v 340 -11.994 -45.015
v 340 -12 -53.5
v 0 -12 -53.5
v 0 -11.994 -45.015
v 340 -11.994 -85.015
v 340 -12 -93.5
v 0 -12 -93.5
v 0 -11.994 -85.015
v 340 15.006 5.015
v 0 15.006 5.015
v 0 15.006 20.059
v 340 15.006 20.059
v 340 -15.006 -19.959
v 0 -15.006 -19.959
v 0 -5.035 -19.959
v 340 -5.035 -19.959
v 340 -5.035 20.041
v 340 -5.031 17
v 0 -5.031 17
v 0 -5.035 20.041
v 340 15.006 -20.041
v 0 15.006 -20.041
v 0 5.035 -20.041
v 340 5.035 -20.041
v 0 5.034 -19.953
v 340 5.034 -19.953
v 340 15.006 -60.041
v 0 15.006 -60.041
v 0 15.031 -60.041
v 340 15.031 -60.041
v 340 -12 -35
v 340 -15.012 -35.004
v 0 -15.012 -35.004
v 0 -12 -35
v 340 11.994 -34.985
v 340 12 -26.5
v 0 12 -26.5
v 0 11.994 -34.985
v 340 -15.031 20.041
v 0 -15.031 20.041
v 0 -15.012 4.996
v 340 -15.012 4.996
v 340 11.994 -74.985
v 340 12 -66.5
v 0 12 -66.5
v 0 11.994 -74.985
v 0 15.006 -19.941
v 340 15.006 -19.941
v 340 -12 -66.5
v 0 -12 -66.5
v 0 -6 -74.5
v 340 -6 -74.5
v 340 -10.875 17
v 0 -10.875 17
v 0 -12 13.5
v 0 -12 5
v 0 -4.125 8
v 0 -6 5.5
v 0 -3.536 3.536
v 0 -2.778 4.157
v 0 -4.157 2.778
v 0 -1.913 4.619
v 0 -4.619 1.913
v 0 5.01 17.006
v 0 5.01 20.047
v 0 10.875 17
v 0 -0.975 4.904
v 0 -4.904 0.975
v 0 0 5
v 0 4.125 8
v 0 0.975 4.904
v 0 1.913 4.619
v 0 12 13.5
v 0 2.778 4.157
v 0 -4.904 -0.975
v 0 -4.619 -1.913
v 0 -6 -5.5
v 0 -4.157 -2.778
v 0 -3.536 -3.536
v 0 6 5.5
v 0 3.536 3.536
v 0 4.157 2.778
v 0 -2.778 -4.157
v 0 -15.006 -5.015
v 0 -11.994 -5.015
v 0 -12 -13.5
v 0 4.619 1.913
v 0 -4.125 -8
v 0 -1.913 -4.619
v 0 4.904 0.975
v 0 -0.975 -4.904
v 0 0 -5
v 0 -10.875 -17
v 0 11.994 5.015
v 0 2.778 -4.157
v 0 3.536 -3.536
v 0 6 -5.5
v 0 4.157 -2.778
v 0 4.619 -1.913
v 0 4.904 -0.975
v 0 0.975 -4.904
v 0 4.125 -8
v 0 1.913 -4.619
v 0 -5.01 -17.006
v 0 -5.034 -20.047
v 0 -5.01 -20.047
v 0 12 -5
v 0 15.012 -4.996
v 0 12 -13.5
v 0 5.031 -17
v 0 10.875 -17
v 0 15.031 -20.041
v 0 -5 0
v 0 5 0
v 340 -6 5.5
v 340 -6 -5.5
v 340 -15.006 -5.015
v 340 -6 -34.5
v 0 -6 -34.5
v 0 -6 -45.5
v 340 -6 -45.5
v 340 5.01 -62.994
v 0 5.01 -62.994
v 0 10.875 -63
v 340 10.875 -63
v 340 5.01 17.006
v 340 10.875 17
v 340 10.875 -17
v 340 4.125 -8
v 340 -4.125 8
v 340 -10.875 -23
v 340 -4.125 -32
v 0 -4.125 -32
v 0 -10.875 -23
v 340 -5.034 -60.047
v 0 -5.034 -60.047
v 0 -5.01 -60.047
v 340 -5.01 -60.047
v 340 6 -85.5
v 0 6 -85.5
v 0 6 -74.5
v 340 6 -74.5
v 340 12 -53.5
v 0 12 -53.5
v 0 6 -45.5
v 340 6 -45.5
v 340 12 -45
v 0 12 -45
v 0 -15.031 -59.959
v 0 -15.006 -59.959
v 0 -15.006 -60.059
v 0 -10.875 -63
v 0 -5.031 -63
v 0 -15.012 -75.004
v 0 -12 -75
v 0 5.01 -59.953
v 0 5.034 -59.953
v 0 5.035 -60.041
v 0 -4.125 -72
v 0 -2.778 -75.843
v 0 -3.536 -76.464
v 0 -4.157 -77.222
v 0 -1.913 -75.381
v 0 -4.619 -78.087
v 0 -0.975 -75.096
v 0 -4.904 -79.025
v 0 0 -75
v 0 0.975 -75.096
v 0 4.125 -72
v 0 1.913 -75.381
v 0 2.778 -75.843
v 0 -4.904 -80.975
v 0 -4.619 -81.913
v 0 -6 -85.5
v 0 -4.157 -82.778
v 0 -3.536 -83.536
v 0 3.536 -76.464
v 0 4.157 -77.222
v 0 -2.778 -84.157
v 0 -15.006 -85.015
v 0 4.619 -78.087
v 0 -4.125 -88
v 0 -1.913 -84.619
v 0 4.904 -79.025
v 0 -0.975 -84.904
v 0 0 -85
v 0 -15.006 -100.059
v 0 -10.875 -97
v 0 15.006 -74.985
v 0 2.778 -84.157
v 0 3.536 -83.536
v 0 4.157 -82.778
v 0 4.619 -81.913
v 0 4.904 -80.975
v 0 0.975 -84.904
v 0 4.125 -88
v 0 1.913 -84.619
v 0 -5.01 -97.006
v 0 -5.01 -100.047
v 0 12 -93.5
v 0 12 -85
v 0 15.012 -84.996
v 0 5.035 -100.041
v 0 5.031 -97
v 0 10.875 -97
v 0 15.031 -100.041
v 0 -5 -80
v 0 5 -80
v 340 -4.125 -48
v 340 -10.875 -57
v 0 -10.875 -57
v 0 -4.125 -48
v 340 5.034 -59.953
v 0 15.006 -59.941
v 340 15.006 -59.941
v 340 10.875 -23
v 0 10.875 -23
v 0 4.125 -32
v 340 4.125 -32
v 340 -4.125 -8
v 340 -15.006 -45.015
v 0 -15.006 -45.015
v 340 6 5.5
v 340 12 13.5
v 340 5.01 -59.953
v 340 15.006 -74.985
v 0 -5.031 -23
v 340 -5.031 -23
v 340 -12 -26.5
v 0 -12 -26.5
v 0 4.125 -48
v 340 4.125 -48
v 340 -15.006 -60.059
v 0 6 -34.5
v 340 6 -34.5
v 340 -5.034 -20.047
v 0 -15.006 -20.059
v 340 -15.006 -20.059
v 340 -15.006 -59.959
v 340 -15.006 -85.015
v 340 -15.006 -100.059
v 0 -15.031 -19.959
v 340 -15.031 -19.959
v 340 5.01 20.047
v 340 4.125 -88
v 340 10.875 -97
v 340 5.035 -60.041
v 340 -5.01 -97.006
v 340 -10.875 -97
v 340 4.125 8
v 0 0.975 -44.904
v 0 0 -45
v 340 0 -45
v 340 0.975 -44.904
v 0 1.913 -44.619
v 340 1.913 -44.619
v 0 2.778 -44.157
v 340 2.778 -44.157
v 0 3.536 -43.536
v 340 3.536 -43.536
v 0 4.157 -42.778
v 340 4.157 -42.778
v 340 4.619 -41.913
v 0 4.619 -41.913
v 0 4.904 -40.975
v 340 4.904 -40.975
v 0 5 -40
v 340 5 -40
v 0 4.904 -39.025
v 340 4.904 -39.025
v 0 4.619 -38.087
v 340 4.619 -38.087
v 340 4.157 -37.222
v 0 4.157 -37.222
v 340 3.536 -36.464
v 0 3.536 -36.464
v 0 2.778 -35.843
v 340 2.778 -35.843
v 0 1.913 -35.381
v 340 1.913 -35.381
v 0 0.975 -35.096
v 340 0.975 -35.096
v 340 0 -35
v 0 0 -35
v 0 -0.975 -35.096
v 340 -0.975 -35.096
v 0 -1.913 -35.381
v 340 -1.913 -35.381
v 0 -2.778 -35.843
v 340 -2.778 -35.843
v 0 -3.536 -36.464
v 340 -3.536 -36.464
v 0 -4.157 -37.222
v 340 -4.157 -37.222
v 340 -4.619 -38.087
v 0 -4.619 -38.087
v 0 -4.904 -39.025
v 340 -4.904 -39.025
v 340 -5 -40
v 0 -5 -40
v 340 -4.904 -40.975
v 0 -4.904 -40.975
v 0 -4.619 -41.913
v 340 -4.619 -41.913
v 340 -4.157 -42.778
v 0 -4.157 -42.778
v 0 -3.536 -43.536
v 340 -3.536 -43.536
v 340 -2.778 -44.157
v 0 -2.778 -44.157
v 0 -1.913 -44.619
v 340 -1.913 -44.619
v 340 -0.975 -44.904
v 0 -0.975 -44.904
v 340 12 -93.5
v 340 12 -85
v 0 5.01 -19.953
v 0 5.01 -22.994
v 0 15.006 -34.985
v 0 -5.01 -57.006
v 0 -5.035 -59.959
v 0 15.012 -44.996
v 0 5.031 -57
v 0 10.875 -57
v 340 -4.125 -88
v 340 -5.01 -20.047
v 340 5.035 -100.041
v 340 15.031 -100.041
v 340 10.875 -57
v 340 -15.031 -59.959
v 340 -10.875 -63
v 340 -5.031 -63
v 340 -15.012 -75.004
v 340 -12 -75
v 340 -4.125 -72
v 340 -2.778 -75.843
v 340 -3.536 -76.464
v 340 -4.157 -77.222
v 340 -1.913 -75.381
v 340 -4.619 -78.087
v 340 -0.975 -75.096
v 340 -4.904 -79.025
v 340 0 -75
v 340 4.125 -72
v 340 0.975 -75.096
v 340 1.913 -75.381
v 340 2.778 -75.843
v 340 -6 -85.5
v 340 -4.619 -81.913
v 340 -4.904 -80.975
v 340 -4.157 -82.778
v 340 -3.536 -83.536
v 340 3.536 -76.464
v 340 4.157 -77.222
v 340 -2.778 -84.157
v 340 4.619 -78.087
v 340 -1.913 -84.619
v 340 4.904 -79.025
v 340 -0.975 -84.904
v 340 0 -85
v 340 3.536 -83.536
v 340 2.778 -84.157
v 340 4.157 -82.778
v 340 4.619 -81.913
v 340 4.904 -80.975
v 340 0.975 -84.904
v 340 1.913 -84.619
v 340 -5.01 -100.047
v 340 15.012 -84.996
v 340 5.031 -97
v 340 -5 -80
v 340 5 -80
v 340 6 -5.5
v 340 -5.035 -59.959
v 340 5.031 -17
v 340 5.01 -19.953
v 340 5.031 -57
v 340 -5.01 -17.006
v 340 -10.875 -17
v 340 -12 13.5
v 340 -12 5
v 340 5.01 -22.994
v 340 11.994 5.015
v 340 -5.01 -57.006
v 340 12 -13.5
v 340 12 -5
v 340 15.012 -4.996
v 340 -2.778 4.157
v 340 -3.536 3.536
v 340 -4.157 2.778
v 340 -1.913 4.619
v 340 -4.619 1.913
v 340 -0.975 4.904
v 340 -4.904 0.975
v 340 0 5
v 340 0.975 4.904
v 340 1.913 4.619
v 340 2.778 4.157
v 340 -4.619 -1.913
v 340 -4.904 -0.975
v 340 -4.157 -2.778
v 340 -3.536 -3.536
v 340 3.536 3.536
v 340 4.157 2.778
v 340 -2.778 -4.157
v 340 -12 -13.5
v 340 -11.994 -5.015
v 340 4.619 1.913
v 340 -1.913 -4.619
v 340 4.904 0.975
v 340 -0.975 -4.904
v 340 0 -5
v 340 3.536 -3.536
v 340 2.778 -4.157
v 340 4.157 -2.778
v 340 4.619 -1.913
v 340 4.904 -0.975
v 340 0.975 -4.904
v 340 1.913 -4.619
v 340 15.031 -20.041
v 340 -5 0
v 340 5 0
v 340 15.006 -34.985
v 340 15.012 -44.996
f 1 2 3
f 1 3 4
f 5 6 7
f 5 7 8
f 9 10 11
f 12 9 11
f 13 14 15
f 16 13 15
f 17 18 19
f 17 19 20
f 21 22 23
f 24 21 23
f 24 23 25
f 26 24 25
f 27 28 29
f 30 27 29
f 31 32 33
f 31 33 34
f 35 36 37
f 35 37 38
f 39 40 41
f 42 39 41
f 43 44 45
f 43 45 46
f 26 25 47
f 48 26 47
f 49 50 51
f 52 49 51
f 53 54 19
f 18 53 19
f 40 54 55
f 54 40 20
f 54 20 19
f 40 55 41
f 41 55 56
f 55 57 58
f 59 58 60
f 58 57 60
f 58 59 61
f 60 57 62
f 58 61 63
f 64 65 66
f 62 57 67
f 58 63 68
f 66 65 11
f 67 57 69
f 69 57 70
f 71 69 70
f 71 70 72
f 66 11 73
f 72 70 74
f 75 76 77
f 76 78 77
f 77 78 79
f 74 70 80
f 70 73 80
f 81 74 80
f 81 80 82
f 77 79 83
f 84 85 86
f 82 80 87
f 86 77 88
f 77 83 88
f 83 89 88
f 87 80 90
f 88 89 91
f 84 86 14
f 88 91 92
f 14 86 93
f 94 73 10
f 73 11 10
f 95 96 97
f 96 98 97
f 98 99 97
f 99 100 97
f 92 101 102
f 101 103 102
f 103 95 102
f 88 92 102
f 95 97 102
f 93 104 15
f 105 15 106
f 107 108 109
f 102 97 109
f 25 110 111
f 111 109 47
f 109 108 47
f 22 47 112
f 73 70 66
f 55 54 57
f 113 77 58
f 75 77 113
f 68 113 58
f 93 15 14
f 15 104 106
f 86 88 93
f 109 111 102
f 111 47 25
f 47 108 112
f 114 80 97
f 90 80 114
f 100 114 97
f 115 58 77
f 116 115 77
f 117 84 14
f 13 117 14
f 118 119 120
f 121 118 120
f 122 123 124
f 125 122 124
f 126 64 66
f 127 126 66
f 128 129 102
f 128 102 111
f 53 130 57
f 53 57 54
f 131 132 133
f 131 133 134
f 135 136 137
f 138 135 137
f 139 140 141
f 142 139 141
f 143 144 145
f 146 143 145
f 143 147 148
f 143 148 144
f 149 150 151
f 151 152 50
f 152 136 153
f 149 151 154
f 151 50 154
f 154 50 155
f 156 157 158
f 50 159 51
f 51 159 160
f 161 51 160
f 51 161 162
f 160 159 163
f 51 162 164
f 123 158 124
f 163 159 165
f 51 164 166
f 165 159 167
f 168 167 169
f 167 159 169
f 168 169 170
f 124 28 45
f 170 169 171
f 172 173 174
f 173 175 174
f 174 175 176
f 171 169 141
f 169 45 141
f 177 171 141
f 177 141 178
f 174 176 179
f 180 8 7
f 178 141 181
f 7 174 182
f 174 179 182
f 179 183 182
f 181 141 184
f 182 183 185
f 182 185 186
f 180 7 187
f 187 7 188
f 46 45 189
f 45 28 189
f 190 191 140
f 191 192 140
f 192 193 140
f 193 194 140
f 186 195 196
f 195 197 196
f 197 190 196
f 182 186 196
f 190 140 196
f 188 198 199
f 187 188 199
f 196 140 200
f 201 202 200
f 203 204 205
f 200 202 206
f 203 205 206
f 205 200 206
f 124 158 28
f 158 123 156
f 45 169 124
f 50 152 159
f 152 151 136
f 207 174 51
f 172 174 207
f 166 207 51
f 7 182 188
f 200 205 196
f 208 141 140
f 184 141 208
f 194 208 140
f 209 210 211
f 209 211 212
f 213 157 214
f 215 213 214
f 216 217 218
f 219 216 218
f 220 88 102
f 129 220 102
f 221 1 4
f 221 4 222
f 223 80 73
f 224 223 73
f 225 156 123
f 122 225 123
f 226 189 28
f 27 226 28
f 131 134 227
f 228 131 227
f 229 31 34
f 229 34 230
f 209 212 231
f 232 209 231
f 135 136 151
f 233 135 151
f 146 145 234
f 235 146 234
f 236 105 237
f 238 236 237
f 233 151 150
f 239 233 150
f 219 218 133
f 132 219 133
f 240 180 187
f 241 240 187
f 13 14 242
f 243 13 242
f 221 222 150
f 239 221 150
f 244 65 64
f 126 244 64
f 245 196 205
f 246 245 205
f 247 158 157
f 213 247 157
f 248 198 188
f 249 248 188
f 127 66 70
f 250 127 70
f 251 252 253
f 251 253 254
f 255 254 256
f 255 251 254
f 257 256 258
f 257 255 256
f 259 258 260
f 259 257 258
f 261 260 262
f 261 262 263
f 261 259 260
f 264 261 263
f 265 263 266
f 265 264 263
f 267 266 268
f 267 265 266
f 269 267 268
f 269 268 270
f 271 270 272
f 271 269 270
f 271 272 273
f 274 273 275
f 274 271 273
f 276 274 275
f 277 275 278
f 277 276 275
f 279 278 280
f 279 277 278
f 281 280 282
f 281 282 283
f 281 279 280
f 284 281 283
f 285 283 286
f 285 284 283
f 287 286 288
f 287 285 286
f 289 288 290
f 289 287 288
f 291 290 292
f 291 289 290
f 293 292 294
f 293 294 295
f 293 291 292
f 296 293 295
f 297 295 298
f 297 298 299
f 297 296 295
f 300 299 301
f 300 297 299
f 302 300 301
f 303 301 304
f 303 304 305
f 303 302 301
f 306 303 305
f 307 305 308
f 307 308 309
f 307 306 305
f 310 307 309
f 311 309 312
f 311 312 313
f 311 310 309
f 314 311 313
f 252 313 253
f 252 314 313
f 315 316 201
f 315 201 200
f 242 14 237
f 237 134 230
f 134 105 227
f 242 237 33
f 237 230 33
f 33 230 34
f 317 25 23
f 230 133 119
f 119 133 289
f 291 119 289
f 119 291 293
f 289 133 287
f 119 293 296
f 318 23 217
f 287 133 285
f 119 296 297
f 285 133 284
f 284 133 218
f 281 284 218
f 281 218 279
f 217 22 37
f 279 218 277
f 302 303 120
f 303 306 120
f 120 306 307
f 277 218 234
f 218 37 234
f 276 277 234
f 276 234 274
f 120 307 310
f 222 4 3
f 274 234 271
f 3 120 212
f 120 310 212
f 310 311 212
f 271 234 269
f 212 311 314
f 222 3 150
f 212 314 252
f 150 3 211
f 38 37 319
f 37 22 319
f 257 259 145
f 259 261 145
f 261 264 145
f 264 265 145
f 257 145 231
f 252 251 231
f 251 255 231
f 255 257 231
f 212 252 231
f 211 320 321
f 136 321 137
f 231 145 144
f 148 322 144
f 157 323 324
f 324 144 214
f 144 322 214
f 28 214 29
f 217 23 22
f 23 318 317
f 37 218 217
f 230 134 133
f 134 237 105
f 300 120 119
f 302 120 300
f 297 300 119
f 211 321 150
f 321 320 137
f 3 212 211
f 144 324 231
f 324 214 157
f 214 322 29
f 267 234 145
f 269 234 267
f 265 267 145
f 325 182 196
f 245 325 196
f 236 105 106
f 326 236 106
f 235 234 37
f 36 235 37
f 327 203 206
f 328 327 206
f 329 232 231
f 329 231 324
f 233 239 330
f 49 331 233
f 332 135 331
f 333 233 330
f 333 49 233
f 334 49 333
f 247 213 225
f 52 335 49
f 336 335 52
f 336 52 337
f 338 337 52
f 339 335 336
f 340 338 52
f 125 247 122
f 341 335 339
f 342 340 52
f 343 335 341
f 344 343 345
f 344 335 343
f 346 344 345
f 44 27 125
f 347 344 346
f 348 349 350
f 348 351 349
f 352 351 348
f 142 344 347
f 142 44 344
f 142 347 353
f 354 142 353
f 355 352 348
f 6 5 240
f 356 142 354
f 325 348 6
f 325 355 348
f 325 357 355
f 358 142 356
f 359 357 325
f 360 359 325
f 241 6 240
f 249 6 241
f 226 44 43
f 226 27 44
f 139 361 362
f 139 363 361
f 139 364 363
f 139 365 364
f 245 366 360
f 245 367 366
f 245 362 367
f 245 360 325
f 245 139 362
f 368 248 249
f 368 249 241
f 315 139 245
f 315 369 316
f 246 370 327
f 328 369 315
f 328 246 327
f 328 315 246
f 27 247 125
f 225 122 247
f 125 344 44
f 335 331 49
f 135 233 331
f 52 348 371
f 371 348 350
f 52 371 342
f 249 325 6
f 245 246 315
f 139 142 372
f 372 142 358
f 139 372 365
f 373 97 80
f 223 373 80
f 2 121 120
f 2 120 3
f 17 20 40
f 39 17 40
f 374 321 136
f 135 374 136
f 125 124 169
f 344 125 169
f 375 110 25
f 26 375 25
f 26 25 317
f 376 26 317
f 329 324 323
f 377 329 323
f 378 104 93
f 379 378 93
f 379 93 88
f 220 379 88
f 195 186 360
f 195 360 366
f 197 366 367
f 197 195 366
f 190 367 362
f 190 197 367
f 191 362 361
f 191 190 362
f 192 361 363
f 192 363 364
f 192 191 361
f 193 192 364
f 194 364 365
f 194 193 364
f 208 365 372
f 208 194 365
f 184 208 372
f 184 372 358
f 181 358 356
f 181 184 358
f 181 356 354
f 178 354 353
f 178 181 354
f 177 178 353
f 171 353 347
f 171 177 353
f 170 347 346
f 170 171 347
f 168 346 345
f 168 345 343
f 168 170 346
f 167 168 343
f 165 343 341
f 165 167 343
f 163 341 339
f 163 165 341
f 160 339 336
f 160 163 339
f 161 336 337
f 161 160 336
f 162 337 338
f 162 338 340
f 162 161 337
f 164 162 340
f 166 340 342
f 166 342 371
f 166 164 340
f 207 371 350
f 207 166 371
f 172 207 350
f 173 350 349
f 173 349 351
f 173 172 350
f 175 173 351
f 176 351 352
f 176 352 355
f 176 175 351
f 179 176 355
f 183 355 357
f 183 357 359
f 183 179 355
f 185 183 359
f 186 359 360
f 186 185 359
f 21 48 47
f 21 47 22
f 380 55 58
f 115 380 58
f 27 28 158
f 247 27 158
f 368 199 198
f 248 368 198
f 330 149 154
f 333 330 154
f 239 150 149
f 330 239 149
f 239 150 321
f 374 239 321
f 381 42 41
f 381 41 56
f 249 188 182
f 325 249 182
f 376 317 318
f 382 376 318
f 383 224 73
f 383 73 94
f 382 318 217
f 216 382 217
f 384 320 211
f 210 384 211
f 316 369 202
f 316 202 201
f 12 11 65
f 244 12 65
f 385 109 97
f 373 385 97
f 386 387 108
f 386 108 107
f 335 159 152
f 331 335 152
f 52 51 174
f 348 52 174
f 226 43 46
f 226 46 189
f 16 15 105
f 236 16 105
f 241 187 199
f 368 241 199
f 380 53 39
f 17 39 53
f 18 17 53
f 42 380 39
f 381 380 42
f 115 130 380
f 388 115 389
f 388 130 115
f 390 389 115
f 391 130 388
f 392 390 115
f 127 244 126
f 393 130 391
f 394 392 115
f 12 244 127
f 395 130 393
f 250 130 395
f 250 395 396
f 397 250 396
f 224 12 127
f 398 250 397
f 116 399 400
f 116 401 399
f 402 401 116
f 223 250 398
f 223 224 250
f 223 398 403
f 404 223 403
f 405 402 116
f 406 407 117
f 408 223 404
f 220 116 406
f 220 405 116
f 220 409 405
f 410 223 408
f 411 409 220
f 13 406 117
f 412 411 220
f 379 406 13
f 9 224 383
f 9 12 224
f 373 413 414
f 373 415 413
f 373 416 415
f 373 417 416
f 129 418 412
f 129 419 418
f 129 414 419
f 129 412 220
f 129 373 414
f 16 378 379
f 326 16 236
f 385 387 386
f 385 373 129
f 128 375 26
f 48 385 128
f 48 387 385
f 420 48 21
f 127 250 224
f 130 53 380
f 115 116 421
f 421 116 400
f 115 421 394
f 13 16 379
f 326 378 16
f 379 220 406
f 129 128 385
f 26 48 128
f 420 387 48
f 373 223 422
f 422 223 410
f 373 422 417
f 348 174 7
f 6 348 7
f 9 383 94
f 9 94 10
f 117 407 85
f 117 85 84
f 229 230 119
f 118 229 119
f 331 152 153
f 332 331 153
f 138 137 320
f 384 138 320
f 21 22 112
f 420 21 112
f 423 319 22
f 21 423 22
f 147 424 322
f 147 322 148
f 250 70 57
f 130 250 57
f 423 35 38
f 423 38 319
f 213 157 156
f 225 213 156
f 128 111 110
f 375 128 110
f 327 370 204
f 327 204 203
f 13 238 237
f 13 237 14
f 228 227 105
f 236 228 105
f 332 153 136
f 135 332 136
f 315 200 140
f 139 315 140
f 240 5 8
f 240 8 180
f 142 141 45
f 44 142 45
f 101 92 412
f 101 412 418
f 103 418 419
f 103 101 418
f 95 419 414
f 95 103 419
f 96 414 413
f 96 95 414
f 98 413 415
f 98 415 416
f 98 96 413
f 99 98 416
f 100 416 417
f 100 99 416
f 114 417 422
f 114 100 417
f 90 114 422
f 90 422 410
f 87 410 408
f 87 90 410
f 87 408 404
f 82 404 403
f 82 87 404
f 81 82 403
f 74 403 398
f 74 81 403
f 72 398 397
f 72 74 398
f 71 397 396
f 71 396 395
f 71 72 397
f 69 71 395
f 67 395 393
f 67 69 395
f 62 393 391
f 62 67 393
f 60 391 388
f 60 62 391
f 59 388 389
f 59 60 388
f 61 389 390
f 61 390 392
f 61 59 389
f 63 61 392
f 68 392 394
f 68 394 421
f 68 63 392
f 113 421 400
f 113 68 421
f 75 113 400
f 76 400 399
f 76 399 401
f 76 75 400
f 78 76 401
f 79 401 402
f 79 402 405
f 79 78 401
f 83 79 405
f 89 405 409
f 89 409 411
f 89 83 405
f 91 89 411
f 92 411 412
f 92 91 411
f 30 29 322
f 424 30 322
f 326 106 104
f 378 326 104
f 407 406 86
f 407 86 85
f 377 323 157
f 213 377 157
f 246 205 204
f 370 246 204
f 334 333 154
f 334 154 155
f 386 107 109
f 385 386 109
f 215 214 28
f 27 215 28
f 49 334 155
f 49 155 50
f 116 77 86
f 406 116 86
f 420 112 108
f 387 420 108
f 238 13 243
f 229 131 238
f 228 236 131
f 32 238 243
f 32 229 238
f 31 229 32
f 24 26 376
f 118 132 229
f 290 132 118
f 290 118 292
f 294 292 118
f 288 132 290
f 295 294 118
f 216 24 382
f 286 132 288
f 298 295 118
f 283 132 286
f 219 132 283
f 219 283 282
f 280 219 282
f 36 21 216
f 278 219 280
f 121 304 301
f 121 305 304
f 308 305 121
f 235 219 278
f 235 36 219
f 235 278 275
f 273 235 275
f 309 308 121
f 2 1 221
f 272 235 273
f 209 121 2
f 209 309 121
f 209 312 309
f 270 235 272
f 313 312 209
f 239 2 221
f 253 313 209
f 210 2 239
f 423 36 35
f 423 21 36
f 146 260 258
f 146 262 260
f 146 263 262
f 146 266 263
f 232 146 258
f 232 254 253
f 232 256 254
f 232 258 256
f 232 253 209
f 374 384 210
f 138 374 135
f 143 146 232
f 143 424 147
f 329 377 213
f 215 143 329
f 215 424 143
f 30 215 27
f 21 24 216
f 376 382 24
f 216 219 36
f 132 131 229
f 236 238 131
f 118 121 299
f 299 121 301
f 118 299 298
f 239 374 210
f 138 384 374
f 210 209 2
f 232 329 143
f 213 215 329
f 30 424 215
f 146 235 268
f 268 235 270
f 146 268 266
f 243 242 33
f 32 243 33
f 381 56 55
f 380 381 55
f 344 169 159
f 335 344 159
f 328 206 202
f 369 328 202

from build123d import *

# Parameters (mm, degrees)
SKETCH1_R           = 5
BOSS_EXTRUDE1_DEPTH = 340


with BuildPart() as part:
    # Sketch1 → Boss-Extrude1 (new body)
    # profile 1 of 3: a face of its own
    with BuildSketch(Plane(origin=(0, 0, 0), x_dir=(0, 0, -1), z_dir=(1, 0, 0))):
        Polygon((-17.006165996, 5.009876651), (-17, 10.875), (-8, 4.125), (-8, -4.125), (-17, -10.875), (-16.999981013, -5.030824138), (-20.040912697, -5.034570514), (-20.040912697, -15.030684523), (-4.996289083, -15.012149805), (-5, -12), (-13.5, -12), (-5.5, -6), (5.5, -6), (13.5, -12), (5.014779989, -11.993830984), (5.014779989, -15.005983074), (19.959087303, -15.005983074), (19.959087303, -5.034570514), (20.047130277, -5.034462047), (20.047099988, -5.009876651), (17.006165996, -5.009876651), (17, -10.875), (8, -4.125), (8, 4.125), (17, 10.875), (16.999981013, 5.030824138), (19.952869723, 5.034462047), (19.94058498, 15.005983074), (20.040912697, 15.005983074), (20.040912697, 15.030684523), (4.996289083, 15.012149805), (5, 12), (13.5, 12), (5.5, 6), (-5.5, 6), (-13.5, 12), (-5.014779989, 11.993830984), (-5.014779989, 15.005983074), (-20.05941502, 15.005983074), (-20.047099988, 5.009876651), align=None)
        Circle(SKETCH1_R, mode=Mode.SUBTRACT)
    # profile 2 of 3: a face of its own
    with BuildSketch(Plane(origin=(0, 0, 0), x_dir=(0, 0, -1), z_dir=(1, 0, 0))):
        Polygon((34.985220011, 15.005983074), (20.040912697, 15.005983074), (20.040912697, 5.034570514), (19.952869723, 5.034462047), (19.952900012, 5.009876651), (22.993834004, 5.009876651), (23, 10.875), (32, 4.125), (32, -4.125), (23, -10.875), (23.000018987, -5.030824138), (20.047130277, -5.034462047), (20.05941502, -15.005983074), (19.959087303, -15.005983074), (19.959087303, -15.030684523), (35.003710917, -15.012149805), (35, -12), (26.5, -12), (34.5, -6), (45.5, -6), (53.5, -12), (45.014779989, -11.993830984), (45.014779989, -15.005983074), (59.959087303, -15.005983074), (59.959087303, -5.034570514), (60.047130277, -5.034462047), (60.047099988, -5.009876651), (57.006165996, -5.009876651), (57, -10.875), (48, -4.125), (48, 4.125), (57, 10.875), (56.999981013, 5.030824138), (59.952869723, 5.034462047), (59.94058498, 15.005983074), (60.040912697, 15.005983074), (60.040912697, 15.030684523), (44.996289083, 15.012149805), (45, 12), (53.5, 12), (45.5, 6), (34.5, 6), (26.5, 12), (34.985220011, 11.993830984), align=None)
        with Locations((40, 0)):
            Circle(SKETCH1_R, mode=Mode.SUBTRACT)
    # profile 3 of 3: a face of its own
    with BuildSketch(Plane(origin=(0, 0, 0), x_dir=(0, 0, -1), z_dir=(1, 0, 0))):
        Polygon((74.985220011, 15.005983074), (60.040912697, 15.005983074), (60.040912697, 5.034570514), (59.952869723, 5.034462047), (59.952900012, 5.009876651), (62.993834004, 5.009876651), (63, 10.875), (72, 4.125), (72, -4.125), (63, -10.875), (63.000018987, -5.030824138), (60.047130277, -5.034462047), (60.05941502, -15.005983074), (59.959087303, -15.005983074), (59.959087303, -15.030684523), (75.003710917, -15.012149805), (75, -12), (66.5, -12), (74.5, -6), (85.5, -6), (93.5, -12), (85.014779989, -11.993830984), (85.014779989, -15.005983074), (100.05941502, -15.005983074), (100.047099988, -5.009876651), (97.006165996, -5.009876651), (97, -10.875), (88, -4.125), (88, 4.125), (97, 10.875), (96.999981013, 5.030824138), (100.040912697, 5.034570514), (100.040912697, 15.030684523), (84.996289083, 15.012149805), (85, 12), (93.5, 12), (85.5, 6), (74.5, 6), (66.5, 12), (74.985220011, 11.993830984), align=None)
        with Locations((80, 0)):
            Circle(SKETCH1_R, mode=Mode.SUBTRACT)
    extrude(amount=BOSS_EXTRUDE1_DEPTH)


solid = part.part
